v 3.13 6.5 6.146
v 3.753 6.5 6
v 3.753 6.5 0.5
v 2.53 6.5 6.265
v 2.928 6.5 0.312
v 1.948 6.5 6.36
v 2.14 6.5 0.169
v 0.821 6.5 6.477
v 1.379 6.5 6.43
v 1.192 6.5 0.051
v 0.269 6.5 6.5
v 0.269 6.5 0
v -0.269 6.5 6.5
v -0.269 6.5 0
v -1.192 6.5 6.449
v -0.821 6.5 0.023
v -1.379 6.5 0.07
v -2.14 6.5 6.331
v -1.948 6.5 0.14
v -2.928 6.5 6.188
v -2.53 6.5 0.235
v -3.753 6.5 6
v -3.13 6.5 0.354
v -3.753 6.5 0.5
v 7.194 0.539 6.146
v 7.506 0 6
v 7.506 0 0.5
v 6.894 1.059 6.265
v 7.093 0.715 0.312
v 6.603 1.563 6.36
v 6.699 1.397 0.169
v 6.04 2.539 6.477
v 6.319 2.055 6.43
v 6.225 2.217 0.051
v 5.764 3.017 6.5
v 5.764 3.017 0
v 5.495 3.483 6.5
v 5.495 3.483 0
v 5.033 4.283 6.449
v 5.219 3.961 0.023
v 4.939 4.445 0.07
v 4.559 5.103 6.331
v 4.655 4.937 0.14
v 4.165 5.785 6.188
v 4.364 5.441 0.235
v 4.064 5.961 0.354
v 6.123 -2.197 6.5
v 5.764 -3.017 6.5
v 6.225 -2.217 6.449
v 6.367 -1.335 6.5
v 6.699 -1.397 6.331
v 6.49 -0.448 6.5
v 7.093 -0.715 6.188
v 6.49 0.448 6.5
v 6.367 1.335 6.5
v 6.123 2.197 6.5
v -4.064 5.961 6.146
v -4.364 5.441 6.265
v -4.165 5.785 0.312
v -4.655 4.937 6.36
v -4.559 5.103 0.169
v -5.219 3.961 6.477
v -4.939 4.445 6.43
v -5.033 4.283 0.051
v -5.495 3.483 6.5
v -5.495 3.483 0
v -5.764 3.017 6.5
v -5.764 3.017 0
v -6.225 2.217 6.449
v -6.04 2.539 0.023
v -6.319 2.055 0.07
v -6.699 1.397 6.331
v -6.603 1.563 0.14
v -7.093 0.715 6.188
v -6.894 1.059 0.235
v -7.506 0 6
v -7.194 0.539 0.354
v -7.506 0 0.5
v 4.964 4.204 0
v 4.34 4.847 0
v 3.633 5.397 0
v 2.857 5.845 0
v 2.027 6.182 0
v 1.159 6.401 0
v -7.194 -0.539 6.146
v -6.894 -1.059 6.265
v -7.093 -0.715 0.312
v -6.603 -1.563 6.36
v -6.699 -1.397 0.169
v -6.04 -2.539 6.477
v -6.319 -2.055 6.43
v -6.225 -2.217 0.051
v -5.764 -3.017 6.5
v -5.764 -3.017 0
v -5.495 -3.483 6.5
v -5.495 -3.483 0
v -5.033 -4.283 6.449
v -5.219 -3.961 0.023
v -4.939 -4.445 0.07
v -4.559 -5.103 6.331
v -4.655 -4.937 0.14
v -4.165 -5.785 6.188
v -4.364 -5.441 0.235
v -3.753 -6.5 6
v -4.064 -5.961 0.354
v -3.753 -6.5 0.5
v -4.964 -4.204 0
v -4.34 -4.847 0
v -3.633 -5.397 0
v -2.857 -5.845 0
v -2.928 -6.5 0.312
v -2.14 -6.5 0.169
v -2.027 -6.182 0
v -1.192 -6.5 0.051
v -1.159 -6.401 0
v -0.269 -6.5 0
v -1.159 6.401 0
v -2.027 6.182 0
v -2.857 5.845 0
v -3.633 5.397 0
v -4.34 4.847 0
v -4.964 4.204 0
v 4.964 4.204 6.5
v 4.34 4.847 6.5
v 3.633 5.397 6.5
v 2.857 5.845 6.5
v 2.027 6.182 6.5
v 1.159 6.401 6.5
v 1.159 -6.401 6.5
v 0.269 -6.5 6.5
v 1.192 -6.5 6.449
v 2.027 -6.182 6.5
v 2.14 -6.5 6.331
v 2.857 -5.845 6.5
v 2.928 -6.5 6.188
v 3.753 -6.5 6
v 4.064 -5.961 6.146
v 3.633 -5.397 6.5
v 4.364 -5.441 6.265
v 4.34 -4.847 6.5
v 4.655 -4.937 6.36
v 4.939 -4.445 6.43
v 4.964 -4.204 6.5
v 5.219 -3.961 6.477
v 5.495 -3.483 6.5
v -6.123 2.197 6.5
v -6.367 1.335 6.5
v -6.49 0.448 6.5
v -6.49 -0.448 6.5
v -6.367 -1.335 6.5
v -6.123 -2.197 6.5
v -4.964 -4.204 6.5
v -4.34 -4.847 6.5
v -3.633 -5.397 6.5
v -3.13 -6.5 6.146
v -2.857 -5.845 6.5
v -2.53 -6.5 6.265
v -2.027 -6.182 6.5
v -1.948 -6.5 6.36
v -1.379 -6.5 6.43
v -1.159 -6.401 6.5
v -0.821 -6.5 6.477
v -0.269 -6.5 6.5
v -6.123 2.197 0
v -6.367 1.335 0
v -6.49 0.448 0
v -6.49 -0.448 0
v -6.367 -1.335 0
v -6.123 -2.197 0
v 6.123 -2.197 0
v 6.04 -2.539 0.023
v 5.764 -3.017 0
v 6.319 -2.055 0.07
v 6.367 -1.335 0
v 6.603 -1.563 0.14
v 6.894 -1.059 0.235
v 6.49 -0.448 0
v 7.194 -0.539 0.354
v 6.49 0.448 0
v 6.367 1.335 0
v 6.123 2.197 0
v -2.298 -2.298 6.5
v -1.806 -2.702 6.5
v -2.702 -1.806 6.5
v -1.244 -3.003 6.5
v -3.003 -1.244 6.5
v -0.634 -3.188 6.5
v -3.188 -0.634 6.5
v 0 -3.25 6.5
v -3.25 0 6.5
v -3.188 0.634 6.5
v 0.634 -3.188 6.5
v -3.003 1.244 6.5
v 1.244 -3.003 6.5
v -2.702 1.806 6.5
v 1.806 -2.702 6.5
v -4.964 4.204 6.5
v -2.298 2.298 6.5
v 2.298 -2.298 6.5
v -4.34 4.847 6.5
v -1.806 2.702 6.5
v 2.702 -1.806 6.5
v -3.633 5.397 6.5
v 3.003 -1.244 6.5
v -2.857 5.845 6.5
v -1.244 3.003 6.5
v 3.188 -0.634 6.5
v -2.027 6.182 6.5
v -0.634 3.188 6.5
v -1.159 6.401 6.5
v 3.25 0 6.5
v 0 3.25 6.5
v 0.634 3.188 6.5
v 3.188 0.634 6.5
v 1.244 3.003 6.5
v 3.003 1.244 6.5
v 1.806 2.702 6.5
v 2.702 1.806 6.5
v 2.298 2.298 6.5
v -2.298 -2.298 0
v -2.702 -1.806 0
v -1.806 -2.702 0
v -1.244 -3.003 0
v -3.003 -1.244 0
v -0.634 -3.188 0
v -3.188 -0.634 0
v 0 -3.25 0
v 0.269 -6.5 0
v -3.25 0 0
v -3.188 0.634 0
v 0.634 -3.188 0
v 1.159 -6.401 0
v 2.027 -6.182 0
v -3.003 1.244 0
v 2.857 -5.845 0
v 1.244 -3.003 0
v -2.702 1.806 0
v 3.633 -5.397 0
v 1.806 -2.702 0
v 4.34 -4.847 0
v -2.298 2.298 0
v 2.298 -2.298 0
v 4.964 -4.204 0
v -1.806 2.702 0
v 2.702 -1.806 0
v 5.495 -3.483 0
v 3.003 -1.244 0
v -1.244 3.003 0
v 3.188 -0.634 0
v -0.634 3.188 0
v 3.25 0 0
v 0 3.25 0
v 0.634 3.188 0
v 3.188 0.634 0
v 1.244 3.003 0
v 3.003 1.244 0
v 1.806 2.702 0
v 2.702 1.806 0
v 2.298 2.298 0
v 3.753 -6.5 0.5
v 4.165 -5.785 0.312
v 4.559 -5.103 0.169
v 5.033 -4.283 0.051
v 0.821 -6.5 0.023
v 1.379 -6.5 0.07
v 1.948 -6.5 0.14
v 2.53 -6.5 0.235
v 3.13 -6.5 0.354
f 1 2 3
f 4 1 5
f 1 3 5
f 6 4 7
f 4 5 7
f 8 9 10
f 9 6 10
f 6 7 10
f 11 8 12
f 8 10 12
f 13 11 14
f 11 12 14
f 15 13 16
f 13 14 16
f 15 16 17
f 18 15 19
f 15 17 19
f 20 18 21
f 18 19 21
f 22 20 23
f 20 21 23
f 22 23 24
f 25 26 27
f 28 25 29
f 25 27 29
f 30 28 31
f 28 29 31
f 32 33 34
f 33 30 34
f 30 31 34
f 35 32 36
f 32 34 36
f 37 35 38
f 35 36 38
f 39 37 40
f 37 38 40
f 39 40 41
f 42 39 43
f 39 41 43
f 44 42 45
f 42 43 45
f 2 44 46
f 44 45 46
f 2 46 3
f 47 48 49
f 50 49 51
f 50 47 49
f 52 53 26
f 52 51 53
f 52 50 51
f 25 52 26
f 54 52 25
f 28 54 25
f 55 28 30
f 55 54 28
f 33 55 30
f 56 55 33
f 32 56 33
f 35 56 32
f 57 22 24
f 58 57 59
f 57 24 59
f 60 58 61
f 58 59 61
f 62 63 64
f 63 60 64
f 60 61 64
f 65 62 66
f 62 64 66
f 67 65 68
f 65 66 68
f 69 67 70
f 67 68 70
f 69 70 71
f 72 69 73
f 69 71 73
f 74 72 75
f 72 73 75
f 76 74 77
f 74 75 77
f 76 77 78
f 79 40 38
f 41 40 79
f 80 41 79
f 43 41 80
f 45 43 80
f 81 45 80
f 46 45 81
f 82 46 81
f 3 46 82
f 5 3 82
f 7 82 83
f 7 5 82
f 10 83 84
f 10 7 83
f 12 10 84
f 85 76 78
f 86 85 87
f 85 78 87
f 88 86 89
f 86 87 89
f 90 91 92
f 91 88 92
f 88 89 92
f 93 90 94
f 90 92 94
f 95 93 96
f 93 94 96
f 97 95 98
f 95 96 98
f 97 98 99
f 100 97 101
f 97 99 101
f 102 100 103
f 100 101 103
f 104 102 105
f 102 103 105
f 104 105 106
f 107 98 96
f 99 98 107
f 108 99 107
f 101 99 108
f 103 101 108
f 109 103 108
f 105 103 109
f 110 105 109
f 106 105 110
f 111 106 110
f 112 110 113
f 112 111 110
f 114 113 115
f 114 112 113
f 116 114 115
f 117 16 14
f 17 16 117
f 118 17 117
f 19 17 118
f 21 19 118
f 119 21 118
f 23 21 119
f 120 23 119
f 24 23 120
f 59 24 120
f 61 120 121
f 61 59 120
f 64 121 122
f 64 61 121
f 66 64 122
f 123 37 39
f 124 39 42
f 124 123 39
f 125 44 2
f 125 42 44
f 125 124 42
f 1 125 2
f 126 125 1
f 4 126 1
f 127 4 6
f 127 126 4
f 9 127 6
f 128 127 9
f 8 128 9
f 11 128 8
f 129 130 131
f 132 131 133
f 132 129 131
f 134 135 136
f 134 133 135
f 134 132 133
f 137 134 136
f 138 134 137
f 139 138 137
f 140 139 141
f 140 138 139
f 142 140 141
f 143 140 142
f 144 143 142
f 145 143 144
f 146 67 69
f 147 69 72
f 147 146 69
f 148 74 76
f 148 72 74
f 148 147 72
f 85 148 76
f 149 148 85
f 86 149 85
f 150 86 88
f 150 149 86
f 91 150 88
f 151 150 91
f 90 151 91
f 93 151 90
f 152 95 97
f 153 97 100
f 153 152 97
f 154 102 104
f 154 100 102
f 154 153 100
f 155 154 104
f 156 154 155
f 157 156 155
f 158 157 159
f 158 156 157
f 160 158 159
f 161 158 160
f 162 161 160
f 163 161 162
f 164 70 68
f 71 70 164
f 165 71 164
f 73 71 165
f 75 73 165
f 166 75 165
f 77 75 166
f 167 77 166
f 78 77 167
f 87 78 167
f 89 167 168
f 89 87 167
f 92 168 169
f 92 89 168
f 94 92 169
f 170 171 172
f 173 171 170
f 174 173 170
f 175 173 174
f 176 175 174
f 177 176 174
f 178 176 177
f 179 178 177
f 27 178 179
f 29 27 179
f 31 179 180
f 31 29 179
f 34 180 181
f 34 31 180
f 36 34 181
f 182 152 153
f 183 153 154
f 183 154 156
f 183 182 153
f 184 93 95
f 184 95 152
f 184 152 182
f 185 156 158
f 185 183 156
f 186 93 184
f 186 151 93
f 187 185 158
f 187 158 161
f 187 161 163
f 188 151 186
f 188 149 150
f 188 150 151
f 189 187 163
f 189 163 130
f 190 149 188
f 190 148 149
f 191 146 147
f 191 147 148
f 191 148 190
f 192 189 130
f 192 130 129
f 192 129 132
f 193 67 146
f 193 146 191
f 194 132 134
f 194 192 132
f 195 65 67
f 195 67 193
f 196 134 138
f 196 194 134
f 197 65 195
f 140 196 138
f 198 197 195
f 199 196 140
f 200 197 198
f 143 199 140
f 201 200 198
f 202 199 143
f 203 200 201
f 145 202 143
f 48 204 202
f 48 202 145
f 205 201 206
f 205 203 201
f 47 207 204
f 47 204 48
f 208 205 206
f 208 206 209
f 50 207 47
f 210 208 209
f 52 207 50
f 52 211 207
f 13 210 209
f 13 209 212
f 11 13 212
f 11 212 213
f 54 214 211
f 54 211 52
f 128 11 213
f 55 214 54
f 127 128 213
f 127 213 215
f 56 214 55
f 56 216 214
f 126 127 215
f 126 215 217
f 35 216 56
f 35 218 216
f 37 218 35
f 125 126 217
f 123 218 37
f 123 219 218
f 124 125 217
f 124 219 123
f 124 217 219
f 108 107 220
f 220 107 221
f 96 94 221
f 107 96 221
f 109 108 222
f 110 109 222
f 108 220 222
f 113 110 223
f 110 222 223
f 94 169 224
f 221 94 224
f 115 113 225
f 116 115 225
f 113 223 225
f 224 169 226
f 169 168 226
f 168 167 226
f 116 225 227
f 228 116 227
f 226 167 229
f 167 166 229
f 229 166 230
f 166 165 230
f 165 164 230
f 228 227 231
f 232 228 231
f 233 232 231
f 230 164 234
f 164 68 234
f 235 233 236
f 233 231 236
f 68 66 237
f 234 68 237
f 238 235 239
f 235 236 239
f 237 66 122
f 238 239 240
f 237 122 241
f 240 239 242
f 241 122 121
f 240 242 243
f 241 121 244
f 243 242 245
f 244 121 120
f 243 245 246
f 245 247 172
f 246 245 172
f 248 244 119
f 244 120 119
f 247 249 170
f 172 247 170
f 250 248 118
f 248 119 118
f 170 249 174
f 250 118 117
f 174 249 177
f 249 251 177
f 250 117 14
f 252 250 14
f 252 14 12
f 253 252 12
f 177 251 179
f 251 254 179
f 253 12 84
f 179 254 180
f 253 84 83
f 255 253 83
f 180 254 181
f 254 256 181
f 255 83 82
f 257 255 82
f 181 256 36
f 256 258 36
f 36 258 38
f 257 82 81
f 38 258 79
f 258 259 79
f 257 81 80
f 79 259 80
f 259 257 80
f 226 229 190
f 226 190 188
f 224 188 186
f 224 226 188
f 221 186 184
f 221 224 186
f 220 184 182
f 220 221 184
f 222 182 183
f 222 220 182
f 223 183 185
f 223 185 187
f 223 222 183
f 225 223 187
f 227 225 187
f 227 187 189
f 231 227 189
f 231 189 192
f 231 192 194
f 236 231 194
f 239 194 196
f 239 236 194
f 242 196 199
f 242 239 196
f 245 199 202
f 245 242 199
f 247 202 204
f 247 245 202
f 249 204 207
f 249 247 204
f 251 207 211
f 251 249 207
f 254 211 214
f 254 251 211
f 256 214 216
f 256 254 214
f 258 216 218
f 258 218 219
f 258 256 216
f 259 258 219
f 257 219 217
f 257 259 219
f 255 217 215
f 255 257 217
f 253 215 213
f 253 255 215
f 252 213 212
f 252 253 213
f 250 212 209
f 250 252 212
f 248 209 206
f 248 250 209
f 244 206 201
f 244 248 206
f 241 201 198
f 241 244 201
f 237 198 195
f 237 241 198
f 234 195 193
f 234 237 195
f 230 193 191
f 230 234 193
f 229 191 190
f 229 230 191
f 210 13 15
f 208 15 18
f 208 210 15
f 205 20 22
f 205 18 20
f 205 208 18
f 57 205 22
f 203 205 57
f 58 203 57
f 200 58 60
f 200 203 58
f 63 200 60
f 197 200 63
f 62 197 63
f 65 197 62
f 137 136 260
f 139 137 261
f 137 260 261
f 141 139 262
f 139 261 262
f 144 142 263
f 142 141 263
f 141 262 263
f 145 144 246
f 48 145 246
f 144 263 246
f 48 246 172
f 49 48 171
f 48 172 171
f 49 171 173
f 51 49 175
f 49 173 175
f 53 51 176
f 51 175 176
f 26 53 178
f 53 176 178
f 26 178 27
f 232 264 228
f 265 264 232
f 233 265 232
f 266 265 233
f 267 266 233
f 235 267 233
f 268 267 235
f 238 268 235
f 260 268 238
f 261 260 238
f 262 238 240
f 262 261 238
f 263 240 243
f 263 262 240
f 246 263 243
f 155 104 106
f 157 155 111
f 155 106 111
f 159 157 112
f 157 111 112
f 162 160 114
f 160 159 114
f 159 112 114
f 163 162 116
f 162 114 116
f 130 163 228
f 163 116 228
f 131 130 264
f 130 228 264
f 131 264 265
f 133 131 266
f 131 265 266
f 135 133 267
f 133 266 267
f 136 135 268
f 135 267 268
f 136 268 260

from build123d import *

# Parameters (mm, degrees)
IZIM1_R                     = 3.25
Y_KSEKLIK_EKSTR_ZYON1_DEPTH = 6.5


with BuildPart() as part:
    # Çizim1 → Yükseklik-Ekstrüzyon1 (new body)
    with BuildSketch(Plane.XY):
        Polygon((7.505553499, 0), (3.75277675, 6.5), (-3.75277675, 6.5), (-7.505553499, 0), (-3.75277675, -6.5), (3.75277675, -6.5), align=None)
        with Locations(Location((0, 0, 0), (0, 0, 180))):
            Circle(IZIM1_R, mode=Mode.SUBTRACT)
    extrude(amount=Y_KSEKLIK_EKSTR_ZYON1_DEPTH)

    # Çizim2 → Kes-Döndür1 (revolve, cut)
    with BuildSketch(Plane(origin=(0, 0, 0), x_dir=(1, 0, 0), z_dir=(0, 1, 0))):
        Polygon((-7.505553499, 0), (-6.505553499, 0), (-7.505553499, -0.5), align=None)
        Polygon((-7.505553499, -6.5), (-7.505553499, -6), (-6.505553499, -6.5), align=None)
    revolve(axis=Axis((0, 0, 0), (0, 0, 1)), mode=Mode.SUBTRACT)


solid = part.part
